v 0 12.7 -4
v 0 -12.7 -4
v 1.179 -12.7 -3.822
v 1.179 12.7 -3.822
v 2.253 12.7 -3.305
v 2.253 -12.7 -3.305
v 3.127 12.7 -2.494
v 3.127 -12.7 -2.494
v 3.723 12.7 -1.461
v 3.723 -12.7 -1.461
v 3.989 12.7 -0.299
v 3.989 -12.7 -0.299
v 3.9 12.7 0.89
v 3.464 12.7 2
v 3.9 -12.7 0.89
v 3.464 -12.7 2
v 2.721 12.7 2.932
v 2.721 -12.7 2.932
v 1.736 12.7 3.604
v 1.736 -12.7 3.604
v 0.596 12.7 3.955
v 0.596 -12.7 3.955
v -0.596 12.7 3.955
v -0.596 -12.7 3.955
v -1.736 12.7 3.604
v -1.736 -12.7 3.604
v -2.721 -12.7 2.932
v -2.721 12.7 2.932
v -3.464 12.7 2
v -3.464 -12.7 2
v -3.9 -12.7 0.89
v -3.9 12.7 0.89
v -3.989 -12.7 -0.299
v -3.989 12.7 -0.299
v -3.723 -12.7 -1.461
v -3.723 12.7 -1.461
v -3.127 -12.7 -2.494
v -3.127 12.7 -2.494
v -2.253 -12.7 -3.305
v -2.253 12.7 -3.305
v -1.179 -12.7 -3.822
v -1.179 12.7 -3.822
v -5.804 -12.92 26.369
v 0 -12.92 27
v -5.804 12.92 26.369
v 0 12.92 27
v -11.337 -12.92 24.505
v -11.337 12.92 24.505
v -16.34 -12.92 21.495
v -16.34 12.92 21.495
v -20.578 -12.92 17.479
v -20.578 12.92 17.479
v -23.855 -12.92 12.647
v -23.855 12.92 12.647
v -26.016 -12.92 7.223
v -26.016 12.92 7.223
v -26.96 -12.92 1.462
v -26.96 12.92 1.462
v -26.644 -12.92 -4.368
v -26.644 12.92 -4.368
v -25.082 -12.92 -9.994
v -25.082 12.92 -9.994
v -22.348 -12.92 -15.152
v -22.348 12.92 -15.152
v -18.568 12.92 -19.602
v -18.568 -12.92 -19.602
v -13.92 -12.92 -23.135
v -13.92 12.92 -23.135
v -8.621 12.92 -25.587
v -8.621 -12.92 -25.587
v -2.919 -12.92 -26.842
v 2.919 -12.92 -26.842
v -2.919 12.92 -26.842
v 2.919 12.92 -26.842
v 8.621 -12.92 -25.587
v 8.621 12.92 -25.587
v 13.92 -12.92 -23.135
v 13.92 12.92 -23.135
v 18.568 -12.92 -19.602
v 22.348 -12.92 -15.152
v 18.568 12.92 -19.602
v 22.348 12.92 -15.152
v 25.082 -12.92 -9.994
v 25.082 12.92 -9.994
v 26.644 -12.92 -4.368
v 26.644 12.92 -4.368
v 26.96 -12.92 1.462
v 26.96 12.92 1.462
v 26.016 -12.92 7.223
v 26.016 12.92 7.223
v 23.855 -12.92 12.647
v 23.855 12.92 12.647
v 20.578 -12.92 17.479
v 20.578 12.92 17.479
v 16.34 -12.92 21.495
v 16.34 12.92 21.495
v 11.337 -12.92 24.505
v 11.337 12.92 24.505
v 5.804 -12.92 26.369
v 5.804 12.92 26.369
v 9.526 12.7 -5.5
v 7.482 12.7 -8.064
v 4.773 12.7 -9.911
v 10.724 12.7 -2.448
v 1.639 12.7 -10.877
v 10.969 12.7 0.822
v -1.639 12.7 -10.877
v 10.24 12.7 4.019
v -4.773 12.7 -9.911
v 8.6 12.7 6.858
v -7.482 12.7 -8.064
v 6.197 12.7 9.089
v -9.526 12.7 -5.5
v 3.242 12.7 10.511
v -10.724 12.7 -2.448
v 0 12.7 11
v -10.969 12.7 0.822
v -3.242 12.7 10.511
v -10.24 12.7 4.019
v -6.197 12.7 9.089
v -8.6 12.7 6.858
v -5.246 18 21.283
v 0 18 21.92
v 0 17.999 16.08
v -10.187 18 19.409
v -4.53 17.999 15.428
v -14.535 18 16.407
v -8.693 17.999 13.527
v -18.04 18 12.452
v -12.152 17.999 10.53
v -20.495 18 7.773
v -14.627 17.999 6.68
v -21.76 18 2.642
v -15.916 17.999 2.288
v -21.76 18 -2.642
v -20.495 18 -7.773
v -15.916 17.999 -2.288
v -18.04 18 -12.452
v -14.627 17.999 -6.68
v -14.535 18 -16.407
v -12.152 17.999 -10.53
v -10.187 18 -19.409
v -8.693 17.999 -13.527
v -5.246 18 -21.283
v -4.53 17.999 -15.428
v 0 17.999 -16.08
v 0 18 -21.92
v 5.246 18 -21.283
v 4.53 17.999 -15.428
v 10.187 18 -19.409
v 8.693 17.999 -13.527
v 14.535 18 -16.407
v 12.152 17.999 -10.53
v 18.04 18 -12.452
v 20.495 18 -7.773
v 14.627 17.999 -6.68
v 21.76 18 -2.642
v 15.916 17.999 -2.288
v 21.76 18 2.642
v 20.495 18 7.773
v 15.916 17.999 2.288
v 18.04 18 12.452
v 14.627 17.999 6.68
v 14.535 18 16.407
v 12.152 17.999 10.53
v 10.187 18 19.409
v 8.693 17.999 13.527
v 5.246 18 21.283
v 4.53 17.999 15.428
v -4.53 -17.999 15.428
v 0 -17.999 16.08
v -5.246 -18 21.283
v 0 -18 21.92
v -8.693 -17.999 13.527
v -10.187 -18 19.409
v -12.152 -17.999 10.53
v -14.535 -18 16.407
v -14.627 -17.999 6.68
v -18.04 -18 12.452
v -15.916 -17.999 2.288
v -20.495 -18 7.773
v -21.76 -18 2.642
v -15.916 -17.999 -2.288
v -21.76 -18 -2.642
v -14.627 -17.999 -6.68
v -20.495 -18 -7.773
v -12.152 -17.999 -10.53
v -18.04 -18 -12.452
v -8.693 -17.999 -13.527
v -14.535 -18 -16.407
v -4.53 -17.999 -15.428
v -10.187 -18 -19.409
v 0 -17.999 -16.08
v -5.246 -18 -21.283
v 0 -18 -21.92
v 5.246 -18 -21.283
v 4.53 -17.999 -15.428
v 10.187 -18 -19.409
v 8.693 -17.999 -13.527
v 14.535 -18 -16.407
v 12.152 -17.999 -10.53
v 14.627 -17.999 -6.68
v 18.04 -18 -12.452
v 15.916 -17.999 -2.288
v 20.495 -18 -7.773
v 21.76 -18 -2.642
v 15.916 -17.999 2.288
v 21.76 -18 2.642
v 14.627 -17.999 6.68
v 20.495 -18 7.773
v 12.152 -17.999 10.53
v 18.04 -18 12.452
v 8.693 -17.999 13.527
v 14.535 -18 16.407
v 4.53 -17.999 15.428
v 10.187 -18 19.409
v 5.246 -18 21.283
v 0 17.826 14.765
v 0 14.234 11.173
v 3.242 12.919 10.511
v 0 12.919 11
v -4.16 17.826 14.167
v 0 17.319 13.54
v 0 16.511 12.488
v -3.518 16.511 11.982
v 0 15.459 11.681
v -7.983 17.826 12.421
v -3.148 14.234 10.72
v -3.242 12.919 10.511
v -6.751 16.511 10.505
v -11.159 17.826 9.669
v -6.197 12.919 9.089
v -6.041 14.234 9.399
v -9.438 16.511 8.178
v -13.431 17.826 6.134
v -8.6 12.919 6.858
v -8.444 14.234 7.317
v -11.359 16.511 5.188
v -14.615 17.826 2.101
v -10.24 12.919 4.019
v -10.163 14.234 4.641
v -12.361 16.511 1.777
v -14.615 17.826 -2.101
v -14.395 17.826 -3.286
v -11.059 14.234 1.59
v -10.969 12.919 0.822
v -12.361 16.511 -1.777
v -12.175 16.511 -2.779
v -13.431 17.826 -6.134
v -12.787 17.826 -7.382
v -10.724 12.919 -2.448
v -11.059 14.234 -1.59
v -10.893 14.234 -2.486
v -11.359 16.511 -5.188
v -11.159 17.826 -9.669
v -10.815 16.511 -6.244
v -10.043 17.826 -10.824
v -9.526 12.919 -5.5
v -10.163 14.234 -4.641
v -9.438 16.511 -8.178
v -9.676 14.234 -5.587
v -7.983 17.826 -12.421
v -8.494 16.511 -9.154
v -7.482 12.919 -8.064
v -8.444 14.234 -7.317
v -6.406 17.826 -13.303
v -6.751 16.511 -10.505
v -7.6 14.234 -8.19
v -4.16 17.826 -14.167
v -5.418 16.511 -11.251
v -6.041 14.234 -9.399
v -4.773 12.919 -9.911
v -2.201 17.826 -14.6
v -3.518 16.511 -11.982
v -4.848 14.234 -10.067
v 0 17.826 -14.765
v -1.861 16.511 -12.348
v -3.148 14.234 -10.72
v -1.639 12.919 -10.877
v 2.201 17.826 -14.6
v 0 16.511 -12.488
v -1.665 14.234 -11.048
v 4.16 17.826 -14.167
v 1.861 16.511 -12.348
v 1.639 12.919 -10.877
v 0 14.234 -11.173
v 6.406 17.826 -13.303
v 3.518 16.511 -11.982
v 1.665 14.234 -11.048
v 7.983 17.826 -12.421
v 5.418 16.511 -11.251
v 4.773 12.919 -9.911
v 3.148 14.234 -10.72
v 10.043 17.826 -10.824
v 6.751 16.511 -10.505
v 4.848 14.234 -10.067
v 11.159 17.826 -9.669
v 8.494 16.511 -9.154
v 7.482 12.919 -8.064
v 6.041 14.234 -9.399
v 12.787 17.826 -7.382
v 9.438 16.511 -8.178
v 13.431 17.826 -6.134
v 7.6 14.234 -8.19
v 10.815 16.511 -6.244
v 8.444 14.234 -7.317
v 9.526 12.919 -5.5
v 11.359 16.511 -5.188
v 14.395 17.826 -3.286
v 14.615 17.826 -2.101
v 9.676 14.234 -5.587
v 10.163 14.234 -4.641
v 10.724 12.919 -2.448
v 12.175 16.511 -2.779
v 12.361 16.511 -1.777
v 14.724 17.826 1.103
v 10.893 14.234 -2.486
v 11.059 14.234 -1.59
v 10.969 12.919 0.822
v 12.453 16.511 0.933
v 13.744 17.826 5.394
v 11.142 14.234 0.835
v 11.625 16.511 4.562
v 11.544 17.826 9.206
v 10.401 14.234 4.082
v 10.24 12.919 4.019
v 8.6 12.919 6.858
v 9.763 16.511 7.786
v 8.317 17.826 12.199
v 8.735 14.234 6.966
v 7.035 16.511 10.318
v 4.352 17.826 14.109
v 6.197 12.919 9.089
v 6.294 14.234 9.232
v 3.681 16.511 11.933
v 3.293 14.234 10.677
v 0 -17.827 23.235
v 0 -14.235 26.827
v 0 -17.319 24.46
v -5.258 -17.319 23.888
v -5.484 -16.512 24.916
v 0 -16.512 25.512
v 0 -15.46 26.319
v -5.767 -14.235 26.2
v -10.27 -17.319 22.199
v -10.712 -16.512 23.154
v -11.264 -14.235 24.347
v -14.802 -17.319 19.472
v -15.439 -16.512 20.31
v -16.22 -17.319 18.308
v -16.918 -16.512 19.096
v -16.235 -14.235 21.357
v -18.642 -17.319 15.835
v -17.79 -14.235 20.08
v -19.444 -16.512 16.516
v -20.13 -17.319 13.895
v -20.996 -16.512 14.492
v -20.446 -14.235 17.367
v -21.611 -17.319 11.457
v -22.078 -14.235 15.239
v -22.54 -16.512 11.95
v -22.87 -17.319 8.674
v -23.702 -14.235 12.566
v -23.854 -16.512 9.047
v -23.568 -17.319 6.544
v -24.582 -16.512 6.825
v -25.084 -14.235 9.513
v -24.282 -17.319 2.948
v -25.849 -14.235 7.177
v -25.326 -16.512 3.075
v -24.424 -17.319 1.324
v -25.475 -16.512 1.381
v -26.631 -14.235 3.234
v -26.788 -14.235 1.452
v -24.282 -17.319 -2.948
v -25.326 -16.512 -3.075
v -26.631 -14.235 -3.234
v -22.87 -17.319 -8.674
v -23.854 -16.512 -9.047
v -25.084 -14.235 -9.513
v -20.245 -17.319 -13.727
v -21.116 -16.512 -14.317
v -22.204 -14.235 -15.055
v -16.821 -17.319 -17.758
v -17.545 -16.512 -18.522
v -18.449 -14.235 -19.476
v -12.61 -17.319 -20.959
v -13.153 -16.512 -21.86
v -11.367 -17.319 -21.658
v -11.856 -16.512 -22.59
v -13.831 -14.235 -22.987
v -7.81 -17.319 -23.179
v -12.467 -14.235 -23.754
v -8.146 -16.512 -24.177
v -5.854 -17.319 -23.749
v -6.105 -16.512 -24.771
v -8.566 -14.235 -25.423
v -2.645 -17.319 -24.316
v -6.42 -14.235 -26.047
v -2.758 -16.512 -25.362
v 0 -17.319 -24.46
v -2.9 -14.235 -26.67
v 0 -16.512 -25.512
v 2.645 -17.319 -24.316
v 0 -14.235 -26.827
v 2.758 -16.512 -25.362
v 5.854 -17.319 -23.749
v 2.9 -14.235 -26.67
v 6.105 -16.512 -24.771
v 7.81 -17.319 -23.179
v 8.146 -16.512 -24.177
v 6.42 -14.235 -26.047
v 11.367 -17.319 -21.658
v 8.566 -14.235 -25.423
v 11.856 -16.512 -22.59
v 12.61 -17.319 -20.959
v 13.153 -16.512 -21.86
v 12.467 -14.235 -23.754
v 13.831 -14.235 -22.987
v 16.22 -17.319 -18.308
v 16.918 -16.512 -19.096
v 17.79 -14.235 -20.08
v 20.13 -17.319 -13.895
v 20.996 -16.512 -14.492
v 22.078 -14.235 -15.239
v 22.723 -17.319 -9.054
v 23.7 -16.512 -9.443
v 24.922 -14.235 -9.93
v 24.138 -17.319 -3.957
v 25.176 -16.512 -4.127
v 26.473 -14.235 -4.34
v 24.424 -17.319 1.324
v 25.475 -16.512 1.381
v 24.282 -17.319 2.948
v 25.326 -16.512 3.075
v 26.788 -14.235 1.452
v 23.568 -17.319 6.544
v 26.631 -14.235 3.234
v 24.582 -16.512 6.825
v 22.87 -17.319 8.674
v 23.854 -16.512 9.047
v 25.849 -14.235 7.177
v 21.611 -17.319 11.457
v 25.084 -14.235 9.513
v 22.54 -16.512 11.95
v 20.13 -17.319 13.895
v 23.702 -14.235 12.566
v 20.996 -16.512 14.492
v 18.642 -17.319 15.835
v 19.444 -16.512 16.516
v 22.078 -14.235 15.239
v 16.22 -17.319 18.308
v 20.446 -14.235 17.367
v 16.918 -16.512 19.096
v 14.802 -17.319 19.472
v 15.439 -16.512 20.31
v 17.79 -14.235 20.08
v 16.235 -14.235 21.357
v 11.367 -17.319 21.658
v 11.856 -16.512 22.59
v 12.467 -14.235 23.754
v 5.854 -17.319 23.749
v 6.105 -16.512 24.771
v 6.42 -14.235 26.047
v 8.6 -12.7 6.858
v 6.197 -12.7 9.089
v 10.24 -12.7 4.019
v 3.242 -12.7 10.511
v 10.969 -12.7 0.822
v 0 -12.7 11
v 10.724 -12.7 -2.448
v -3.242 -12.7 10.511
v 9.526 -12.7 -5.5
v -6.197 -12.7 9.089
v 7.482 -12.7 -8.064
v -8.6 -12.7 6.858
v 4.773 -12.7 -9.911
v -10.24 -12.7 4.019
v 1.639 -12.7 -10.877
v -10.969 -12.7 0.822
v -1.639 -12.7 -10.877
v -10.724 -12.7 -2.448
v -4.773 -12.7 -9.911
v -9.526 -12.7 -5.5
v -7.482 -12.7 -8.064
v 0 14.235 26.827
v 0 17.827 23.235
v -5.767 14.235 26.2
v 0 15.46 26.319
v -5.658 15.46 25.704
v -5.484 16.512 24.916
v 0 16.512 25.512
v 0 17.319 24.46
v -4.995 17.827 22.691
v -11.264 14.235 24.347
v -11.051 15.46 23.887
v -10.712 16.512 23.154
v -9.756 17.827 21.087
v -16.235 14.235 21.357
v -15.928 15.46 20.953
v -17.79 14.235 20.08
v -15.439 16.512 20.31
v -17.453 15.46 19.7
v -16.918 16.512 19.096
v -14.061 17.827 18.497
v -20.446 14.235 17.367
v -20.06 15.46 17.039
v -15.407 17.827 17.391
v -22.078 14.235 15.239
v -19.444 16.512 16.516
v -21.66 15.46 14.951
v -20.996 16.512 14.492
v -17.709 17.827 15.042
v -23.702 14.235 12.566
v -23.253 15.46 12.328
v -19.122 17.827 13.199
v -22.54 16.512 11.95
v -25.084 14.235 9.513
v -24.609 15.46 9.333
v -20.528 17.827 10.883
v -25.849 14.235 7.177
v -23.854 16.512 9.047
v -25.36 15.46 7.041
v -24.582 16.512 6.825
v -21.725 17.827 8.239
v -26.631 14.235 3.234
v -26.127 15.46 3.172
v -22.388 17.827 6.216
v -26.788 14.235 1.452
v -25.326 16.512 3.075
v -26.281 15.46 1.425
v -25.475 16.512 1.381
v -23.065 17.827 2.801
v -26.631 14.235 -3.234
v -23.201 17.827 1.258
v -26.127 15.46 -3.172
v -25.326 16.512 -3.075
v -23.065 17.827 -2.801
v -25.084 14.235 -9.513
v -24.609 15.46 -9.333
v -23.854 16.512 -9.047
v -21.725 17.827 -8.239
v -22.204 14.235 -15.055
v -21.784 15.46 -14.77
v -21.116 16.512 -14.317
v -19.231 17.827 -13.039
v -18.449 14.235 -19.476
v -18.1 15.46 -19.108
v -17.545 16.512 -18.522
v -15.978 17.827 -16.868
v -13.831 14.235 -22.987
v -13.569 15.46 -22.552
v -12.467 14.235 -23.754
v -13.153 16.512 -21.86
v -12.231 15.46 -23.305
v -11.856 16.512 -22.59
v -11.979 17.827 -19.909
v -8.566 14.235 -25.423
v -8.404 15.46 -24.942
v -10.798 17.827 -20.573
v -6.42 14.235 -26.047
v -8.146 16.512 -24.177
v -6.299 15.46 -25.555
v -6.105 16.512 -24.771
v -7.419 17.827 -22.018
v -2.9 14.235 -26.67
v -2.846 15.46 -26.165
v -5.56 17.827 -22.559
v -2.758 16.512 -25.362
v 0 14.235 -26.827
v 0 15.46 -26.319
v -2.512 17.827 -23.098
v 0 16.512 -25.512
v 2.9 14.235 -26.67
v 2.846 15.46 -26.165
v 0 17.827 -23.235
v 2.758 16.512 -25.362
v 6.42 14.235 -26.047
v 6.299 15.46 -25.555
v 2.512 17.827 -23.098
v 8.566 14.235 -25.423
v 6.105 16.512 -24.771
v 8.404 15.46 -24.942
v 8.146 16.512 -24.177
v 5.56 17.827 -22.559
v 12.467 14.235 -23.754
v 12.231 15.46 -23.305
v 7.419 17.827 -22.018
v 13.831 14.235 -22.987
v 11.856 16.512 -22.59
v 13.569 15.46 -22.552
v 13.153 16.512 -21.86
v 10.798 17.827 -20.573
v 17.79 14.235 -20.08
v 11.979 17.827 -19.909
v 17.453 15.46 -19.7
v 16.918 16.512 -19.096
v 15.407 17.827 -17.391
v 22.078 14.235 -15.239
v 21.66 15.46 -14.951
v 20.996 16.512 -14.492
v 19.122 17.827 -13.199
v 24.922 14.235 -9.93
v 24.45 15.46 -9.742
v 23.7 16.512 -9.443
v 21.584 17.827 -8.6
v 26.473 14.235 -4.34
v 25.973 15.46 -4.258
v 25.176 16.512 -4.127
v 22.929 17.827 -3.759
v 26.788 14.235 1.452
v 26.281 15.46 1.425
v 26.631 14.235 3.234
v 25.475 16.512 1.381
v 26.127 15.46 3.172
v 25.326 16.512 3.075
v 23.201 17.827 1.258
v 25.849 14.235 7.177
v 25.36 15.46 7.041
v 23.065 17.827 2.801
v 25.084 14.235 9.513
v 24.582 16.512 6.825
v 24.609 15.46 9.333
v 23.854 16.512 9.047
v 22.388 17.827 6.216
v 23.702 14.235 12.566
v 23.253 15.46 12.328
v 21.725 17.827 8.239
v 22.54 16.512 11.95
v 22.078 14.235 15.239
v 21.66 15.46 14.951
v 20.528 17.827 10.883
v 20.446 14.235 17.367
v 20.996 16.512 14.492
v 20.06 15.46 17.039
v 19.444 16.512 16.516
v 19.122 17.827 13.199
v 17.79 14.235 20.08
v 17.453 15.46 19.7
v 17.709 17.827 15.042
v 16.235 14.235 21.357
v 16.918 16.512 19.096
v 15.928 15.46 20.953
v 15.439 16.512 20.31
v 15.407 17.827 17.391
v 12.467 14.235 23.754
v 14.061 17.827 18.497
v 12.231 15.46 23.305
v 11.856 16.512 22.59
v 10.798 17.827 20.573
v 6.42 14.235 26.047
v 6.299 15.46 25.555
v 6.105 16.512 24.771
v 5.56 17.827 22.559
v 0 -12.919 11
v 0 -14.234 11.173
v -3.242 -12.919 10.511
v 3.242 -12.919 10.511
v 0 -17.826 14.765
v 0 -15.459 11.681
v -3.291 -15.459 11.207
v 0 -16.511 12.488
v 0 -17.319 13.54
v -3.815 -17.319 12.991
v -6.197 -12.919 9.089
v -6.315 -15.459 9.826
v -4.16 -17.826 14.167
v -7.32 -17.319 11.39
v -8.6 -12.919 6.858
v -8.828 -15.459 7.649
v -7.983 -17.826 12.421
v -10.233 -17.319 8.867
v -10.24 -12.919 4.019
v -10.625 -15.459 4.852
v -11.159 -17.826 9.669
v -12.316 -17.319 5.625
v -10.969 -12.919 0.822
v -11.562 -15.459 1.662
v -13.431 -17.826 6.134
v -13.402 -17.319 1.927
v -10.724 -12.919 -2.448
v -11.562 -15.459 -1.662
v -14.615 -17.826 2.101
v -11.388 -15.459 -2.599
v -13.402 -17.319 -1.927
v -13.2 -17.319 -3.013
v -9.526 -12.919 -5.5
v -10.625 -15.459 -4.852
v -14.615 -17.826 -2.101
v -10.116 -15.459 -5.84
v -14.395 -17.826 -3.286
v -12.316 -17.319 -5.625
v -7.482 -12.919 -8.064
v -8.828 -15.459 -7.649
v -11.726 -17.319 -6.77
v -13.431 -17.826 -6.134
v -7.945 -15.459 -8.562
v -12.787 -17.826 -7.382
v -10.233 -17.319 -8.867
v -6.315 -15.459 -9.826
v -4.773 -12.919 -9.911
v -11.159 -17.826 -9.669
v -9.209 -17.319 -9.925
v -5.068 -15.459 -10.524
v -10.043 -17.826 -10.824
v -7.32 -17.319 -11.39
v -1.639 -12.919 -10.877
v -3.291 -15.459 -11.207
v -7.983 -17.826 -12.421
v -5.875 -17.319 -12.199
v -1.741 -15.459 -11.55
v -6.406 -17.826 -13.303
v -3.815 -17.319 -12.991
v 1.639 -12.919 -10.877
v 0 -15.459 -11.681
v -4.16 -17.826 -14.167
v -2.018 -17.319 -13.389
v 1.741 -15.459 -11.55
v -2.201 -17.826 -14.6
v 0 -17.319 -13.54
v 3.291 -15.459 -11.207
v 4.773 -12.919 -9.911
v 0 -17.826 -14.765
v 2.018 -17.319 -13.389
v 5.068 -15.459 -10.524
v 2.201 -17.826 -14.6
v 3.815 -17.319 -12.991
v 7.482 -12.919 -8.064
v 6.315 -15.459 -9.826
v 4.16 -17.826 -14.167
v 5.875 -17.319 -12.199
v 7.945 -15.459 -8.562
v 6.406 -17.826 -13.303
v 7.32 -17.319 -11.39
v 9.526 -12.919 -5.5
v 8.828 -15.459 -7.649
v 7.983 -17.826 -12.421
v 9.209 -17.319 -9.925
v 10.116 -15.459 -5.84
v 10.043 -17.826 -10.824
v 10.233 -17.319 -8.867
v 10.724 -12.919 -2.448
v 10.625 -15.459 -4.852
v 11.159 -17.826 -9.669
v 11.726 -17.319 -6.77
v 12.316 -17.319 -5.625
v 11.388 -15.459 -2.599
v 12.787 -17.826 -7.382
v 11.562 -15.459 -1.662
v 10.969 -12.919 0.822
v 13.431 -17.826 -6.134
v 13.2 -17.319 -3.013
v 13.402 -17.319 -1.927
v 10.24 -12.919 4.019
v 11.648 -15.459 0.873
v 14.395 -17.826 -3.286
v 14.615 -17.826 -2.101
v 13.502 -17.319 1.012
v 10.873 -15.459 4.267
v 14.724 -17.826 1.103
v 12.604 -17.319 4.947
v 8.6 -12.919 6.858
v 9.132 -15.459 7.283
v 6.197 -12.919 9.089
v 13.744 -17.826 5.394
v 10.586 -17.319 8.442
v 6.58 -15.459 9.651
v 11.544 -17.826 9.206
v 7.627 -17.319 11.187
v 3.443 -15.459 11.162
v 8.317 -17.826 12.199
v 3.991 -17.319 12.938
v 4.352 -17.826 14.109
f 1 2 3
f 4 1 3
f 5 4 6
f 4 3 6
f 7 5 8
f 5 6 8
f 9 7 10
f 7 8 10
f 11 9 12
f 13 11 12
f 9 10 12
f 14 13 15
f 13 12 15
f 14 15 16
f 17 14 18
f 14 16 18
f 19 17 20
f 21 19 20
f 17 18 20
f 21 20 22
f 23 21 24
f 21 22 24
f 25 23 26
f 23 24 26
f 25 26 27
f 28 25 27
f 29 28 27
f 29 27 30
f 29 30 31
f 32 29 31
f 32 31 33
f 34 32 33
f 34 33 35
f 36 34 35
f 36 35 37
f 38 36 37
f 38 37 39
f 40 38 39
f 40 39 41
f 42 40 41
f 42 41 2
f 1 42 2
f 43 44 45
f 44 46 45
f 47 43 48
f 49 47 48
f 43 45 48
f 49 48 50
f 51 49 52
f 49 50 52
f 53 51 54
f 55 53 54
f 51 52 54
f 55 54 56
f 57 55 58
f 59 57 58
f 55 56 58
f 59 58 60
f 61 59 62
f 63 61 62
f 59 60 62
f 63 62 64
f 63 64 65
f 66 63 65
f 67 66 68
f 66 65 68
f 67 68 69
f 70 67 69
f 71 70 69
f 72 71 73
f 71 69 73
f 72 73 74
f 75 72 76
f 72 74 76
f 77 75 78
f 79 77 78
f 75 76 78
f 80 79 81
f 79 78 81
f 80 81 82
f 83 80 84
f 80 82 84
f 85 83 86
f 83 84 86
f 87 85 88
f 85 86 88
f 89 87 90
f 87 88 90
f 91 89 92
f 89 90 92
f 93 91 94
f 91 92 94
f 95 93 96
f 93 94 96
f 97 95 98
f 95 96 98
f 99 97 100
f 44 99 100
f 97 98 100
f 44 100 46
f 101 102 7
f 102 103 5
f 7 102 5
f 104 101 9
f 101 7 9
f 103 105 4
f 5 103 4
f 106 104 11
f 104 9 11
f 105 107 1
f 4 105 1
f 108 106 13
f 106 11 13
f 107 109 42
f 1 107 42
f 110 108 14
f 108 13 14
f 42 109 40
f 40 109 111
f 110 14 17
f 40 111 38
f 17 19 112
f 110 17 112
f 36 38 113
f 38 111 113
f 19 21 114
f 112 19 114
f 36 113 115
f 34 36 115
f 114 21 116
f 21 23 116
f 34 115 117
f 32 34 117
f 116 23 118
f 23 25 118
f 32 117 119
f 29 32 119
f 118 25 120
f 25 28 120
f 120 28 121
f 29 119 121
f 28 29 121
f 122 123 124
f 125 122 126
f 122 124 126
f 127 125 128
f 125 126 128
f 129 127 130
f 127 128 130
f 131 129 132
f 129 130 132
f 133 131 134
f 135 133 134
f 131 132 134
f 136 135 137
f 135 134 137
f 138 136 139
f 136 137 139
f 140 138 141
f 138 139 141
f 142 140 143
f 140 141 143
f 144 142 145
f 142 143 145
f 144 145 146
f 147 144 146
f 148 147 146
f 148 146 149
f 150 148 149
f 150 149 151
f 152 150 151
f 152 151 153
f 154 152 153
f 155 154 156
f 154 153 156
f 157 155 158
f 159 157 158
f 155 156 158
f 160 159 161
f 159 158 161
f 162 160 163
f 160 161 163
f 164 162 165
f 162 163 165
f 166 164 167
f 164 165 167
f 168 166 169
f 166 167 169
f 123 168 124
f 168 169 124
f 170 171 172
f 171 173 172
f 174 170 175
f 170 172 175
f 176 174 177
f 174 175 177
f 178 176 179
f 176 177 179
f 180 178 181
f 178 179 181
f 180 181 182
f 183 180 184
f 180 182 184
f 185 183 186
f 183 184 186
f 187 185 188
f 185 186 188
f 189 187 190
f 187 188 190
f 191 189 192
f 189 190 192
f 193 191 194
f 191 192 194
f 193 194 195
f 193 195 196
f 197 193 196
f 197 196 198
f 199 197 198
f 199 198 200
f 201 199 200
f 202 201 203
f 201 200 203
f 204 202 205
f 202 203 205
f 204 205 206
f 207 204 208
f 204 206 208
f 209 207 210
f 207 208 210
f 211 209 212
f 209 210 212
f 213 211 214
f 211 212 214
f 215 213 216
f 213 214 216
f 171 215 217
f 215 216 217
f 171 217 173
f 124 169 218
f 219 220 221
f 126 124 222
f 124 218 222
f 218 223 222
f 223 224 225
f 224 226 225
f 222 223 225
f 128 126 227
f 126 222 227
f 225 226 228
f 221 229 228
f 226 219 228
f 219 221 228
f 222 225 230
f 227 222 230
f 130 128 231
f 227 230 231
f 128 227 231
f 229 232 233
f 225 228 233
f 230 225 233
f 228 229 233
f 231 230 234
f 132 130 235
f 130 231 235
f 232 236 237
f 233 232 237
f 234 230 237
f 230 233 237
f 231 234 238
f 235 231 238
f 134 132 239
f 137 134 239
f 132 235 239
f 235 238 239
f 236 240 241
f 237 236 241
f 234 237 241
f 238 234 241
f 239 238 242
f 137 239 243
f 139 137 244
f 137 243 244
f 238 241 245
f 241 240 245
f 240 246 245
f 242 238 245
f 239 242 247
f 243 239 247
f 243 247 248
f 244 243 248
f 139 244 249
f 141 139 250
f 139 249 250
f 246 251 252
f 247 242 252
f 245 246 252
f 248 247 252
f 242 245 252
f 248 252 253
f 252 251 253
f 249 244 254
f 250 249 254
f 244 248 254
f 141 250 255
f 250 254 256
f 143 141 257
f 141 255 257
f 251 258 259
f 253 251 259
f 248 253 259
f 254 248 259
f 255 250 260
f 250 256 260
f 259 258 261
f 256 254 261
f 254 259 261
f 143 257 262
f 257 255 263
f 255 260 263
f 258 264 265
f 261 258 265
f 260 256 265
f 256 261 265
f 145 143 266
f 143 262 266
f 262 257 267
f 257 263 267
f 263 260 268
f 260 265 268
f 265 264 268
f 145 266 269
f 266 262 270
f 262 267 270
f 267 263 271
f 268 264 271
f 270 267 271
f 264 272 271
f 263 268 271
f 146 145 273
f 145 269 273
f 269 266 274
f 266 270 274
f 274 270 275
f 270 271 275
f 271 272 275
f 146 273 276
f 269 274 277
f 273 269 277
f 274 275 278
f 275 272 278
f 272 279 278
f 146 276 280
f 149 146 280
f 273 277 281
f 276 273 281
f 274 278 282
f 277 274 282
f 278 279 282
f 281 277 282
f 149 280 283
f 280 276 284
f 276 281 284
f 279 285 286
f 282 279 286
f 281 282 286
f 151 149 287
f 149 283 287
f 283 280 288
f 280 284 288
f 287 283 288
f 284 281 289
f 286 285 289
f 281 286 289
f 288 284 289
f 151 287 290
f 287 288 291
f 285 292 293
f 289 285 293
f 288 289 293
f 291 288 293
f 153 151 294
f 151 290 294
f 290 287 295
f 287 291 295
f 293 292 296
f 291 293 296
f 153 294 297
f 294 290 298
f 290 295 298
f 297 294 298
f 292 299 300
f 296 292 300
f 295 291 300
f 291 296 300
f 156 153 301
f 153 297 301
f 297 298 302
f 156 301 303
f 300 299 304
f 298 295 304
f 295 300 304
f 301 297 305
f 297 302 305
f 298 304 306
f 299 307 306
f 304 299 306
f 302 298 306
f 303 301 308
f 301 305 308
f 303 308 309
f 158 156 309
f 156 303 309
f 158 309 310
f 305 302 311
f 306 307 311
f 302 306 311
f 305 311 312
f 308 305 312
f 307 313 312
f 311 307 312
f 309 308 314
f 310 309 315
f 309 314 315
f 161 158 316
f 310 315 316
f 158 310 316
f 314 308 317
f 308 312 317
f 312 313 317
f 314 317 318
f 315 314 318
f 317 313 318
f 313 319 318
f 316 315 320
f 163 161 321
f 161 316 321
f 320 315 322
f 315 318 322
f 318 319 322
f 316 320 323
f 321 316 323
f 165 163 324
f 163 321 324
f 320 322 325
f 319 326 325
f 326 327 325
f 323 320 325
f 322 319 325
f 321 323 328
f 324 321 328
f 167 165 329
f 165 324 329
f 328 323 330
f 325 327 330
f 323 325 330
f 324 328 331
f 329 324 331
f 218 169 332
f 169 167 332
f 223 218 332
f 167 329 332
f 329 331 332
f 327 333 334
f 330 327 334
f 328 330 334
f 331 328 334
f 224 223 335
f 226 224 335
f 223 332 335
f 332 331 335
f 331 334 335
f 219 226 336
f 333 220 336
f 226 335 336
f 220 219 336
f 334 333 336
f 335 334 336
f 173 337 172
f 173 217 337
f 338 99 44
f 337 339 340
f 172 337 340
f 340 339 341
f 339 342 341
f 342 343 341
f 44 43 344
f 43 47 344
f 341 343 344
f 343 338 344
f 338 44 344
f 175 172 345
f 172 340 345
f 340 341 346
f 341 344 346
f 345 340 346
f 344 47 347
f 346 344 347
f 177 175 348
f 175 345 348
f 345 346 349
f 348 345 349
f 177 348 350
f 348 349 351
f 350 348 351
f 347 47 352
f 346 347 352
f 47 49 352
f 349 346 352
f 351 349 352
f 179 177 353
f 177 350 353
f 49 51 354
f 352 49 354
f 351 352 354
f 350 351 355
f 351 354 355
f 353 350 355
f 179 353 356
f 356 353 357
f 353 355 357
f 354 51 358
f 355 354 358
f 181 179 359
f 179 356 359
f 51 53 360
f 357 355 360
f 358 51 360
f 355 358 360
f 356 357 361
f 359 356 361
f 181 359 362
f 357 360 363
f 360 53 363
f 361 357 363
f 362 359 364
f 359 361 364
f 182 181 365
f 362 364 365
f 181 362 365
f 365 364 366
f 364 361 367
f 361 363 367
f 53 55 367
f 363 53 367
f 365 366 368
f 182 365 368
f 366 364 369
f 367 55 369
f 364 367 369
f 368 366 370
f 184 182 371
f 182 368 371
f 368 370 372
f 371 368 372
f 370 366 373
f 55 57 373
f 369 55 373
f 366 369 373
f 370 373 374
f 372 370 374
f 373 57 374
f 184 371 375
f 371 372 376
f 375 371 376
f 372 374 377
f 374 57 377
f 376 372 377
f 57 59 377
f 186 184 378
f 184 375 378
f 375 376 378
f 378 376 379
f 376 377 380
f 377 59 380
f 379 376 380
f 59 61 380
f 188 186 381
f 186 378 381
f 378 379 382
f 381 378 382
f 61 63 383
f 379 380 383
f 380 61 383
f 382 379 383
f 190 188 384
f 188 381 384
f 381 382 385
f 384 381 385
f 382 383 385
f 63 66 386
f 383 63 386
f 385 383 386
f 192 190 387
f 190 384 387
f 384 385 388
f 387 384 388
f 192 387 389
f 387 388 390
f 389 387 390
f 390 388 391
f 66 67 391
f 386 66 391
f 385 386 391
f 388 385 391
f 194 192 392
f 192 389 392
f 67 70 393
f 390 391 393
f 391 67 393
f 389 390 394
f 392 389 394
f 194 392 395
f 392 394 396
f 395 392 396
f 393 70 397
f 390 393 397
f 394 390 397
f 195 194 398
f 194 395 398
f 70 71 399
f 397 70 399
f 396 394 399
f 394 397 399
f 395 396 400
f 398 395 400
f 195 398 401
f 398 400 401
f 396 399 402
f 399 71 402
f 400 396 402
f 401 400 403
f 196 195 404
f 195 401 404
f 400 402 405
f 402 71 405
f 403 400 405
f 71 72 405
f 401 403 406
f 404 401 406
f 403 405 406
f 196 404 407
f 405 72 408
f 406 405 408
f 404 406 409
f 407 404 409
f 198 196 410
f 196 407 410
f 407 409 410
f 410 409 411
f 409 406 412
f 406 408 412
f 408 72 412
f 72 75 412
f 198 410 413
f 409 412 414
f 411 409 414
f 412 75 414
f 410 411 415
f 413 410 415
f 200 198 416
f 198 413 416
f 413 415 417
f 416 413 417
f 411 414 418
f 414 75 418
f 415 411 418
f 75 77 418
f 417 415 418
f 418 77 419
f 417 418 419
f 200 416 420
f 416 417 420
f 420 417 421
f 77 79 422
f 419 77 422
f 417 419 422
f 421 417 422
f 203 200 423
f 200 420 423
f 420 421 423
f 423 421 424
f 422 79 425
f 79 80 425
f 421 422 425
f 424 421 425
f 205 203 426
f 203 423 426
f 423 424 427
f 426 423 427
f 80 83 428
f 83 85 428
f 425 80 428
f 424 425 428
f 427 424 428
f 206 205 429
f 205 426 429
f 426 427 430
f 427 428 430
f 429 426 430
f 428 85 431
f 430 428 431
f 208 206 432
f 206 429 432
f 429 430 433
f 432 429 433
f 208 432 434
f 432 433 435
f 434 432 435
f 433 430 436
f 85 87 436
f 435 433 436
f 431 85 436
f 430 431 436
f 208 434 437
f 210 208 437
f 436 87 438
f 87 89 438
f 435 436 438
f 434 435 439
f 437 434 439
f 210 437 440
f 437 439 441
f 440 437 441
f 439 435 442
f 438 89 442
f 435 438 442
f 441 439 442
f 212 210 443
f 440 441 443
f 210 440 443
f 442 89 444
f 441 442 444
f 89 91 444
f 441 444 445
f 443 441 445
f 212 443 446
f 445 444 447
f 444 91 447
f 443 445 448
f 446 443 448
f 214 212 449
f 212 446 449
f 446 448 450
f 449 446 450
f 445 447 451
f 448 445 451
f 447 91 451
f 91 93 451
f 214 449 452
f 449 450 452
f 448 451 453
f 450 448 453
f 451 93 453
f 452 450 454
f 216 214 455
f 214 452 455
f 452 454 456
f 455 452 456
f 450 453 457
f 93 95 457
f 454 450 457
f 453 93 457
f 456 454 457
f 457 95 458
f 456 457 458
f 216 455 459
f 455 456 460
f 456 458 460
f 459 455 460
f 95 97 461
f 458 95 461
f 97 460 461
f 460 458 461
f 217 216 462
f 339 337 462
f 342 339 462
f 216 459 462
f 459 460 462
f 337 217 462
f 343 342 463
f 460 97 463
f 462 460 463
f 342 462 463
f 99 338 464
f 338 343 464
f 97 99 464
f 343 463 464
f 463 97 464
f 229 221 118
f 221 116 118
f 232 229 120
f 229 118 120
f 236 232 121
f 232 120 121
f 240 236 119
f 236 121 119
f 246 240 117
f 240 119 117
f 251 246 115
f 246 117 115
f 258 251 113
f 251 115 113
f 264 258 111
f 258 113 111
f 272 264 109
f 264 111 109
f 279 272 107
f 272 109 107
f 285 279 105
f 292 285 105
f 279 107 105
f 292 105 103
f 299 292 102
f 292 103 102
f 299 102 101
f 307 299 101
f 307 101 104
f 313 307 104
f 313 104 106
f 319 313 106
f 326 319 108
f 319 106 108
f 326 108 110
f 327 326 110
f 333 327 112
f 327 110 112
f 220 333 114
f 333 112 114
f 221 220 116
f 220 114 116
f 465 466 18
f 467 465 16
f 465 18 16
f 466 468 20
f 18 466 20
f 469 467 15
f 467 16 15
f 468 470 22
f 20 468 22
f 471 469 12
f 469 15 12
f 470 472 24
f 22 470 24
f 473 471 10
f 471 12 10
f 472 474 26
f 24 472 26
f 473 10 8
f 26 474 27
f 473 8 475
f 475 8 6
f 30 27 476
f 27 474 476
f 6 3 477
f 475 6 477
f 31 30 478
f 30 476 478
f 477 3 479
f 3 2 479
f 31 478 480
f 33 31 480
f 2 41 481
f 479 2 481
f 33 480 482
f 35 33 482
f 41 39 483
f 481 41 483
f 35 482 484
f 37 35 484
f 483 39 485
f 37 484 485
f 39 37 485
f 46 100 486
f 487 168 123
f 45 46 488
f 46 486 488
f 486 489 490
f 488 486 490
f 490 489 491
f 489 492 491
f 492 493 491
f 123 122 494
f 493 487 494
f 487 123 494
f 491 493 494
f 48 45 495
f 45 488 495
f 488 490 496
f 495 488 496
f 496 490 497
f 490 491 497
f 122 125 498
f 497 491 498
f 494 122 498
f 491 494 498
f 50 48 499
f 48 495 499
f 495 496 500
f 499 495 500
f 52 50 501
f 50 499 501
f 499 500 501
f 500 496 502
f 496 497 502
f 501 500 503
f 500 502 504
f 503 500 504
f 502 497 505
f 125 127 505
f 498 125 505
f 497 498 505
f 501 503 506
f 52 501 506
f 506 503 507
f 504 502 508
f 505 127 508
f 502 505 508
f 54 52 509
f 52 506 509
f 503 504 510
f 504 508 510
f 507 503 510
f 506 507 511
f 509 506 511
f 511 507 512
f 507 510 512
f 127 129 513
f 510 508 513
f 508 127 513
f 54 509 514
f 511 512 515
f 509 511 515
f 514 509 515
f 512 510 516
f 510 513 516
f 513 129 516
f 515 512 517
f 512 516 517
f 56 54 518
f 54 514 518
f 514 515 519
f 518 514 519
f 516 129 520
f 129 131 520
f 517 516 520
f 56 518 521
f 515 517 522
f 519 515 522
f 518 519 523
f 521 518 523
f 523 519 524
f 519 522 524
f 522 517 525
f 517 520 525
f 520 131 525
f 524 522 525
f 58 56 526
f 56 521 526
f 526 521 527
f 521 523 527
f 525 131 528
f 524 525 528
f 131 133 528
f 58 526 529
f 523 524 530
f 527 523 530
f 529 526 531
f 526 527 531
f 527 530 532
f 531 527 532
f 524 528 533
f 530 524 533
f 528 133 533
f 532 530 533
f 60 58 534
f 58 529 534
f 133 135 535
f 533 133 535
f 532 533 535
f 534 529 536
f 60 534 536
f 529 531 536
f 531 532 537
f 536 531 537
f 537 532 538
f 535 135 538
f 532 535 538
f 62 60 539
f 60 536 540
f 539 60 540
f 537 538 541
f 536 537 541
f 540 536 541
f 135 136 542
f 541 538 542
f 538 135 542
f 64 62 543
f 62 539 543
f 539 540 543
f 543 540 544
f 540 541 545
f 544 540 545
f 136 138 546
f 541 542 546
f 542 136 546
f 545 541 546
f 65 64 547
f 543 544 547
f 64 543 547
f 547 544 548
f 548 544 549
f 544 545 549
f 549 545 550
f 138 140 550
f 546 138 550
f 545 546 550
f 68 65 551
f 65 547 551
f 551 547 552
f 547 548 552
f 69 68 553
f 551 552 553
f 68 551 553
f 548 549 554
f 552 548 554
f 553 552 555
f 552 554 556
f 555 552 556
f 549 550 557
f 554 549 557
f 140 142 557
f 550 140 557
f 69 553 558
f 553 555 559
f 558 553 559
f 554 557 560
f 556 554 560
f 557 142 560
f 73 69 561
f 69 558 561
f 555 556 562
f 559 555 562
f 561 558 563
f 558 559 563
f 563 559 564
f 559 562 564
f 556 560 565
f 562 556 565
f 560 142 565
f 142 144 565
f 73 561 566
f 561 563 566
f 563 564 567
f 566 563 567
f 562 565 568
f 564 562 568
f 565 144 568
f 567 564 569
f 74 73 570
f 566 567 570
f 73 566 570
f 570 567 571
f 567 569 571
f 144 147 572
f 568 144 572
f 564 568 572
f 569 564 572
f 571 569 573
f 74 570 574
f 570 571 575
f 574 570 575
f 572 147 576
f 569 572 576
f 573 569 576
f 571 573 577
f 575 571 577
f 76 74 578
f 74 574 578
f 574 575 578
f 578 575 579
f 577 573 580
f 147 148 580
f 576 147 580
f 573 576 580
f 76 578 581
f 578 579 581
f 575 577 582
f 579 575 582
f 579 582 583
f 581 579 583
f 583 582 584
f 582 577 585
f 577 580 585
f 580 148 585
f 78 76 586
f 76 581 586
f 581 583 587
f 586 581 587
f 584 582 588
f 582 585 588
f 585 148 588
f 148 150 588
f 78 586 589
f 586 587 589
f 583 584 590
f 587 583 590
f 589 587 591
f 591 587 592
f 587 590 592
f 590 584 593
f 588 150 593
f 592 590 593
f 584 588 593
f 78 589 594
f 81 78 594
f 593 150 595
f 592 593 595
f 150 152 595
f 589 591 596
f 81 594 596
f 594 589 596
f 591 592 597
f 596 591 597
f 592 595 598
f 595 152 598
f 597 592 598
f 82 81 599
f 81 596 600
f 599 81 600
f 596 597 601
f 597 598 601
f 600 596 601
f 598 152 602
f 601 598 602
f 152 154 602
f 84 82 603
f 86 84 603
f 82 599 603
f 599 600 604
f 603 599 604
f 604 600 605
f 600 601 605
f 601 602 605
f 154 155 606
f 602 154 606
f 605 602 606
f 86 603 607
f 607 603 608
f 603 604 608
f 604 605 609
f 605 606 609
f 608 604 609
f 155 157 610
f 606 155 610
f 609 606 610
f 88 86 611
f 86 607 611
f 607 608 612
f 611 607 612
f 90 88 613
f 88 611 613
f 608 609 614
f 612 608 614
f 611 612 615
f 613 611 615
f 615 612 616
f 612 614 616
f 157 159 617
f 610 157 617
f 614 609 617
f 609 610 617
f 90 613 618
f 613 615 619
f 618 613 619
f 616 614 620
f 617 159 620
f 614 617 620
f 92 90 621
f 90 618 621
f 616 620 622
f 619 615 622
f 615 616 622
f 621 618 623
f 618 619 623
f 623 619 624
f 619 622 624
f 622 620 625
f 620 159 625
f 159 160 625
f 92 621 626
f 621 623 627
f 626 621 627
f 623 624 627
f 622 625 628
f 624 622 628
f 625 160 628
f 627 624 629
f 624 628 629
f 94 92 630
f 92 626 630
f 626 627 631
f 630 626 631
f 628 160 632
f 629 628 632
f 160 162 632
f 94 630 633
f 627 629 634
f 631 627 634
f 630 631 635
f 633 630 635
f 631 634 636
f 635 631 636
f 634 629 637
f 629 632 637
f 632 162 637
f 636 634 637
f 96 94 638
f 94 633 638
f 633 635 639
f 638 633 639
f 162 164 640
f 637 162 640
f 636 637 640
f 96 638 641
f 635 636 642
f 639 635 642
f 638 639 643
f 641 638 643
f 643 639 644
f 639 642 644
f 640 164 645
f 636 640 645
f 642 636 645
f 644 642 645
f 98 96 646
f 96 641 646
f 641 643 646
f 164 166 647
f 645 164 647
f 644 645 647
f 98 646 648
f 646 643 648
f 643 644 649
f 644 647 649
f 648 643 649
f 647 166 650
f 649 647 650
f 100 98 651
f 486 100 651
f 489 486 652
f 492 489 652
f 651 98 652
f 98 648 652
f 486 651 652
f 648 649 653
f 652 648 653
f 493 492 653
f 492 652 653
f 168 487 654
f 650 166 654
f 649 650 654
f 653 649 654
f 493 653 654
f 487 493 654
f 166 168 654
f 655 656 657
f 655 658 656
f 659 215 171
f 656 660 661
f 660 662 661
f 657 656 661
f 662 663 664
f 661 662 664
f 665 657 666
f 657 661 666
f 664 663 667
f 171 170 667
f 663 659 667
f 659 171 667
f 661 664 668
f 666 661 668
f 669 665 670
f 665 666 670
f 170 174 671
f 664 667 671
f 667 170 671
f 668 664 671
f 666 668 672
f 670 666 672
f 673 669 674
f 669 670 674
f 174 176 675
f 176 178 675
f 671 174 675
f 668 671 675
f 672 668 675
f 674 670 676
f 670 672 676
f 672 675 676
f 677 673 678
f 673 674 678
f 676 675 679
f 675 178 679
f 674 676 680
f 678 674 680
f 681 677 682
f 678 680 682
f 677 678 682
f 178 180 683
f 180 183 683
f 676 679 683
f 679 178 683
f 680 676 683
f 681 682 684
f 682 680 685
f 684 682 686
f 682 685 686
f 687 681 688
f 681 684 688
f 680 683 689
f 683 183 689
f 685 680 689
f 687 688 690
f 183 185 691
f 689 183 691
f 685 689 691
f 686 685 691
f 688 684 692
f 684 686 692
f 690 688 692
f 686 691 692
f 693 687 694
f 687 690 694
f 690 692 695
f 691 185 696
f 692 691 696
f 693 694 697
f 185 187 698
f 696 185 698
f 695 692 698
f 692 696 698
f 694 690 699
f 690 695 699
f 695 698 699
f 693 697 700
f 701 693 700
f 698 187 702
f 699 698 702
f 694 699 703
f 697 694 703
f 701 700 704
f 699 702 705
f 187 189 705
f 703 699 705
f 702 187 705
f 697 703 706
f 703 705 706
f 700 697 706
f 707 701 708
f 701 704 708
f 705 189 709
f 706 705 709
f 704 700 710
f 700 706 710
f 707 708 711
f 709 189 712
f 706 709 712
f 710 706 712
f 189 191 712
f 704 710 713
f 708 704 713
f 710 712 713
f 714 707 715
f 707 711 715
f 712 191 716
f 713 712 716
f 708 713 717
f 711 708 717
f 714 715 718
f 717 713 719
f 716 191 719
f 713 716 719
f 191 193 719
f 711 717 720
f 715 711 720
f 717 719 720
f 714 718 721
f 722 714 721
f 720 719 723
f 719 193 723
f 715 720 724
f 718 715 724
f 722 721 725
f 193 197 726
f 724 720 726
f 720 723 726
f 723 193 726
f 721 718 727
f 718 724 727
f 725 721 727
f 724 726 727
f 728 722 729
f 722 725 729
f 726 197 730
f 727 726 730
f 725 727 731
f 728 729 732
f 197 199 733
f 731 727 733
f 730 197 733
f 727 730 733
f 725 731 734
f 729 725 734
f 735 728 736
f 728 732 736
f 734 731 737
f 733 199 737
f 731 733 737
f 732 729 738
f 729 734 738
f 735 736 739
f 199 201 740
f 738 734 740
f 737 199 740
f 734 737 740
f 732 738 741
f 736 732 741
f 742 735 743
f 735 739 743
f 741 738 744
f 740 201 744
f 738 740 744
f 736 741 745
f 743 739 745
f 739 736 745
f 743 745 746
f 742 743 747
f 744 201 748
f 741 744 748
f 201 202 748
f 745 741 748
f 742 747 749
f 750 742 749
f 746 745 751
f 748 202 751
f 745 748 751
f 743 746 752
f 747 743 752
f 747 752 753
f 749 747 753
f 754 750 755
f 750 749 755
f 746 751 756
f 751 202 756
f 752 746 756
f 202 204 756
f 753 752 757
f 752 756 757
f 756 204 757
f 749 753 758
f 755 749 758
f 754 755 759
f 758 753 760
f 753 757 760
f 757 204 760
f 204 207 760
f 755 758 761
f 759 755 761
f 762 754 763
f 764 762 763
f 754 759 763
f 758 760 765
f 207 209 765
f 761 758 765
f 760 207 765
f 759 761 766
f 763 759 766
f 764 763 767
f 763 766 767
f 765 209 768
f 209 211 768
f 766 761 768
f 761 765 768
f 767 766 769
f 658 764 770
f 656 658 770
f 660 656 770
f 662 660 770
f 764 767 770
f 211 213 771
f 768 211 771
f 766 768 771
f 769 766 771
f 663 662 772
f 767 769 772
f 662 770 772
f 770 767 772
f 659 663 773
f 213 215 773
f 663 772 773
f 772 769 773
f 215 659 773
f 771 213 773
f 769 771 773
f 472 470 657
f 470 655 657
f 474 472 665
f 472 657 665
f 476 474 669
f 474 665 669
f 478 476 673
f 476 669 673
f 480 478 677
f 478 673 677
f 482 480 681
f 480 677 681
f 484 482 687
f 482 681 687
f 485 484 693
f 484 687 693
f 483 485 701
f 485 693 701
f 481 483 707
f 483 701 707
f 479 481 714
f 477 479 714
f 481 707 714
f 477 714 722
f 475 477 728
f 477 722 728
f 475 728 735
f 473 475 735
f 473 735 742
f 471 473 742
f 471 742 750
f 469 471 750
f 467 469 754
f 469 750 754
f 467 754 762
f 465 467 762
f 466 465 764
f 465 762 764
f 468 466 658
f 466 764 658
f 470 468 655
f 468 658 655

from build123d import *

# Parameters (mm, degrees)
SKETCH2_R          = 4
CUT_EXTRUDE1_DEPTH = 54.356


with BuildPart() as part:
    # Sketch1 → Revolve3 (revolve)
    with BuildSketch(Plane.XY, mode=Mode.PRIVATE) as revolve3_sk:
        with BuildLine():
            Line((0, 12.7), (0, -12.7))
            Line((0, -12.7), (11, -12.7))
            Line((11, -12.7), (11, -12.919434808))
            ThreePointArc((11, -12.919434808), (12.487804595, -16.511444297), (16.079737075, -17.999434801))
            Line((16.079737075, -17.999434801), (21.919737075, -17.999737061))
            ThreePointArc((21.919737075, -17.999737061), (25.512009489, -16.511932473), (27, -12.919737068))
            Line((27, -12.919737068), (27, 12.919737068))
            ThreePointArc((27, 12.919737068), (25.512009489, 16.511932473), (21.919737075, 17.999737061))
            Line((21.919737075, 17.999737061), (16.079737075, 17.999434801))
            ThreePointArc((16.079737075, 17.999434801), (12.487804595, 16.511444297), (11, 12.919434808))
            Line((11, 12.919434808), (11, 12.7))
            Line((11, 12.7), (0, 12.7))
        make_face()
    revolve(revolve3_sk.sketch.rotate(Axis((0, 12.7, 0), (0, -1, 0)), 90), axis=Axis((0, 12.7, 0), (0, -1, 0)))

    # Sketch2 → Cut-Extrude1 (cut)
    with BuildSketch(Plane.XZ.offset(12.7)):
        with Locations(Location((0, 0, 0), (0, 0, 270))):
            Circle(SKETCH2_R)
    extrude(amount=-CUT_EXTRUDE1_DEPTH, mode=Mode.SUBTRACT)


solid = part.part
